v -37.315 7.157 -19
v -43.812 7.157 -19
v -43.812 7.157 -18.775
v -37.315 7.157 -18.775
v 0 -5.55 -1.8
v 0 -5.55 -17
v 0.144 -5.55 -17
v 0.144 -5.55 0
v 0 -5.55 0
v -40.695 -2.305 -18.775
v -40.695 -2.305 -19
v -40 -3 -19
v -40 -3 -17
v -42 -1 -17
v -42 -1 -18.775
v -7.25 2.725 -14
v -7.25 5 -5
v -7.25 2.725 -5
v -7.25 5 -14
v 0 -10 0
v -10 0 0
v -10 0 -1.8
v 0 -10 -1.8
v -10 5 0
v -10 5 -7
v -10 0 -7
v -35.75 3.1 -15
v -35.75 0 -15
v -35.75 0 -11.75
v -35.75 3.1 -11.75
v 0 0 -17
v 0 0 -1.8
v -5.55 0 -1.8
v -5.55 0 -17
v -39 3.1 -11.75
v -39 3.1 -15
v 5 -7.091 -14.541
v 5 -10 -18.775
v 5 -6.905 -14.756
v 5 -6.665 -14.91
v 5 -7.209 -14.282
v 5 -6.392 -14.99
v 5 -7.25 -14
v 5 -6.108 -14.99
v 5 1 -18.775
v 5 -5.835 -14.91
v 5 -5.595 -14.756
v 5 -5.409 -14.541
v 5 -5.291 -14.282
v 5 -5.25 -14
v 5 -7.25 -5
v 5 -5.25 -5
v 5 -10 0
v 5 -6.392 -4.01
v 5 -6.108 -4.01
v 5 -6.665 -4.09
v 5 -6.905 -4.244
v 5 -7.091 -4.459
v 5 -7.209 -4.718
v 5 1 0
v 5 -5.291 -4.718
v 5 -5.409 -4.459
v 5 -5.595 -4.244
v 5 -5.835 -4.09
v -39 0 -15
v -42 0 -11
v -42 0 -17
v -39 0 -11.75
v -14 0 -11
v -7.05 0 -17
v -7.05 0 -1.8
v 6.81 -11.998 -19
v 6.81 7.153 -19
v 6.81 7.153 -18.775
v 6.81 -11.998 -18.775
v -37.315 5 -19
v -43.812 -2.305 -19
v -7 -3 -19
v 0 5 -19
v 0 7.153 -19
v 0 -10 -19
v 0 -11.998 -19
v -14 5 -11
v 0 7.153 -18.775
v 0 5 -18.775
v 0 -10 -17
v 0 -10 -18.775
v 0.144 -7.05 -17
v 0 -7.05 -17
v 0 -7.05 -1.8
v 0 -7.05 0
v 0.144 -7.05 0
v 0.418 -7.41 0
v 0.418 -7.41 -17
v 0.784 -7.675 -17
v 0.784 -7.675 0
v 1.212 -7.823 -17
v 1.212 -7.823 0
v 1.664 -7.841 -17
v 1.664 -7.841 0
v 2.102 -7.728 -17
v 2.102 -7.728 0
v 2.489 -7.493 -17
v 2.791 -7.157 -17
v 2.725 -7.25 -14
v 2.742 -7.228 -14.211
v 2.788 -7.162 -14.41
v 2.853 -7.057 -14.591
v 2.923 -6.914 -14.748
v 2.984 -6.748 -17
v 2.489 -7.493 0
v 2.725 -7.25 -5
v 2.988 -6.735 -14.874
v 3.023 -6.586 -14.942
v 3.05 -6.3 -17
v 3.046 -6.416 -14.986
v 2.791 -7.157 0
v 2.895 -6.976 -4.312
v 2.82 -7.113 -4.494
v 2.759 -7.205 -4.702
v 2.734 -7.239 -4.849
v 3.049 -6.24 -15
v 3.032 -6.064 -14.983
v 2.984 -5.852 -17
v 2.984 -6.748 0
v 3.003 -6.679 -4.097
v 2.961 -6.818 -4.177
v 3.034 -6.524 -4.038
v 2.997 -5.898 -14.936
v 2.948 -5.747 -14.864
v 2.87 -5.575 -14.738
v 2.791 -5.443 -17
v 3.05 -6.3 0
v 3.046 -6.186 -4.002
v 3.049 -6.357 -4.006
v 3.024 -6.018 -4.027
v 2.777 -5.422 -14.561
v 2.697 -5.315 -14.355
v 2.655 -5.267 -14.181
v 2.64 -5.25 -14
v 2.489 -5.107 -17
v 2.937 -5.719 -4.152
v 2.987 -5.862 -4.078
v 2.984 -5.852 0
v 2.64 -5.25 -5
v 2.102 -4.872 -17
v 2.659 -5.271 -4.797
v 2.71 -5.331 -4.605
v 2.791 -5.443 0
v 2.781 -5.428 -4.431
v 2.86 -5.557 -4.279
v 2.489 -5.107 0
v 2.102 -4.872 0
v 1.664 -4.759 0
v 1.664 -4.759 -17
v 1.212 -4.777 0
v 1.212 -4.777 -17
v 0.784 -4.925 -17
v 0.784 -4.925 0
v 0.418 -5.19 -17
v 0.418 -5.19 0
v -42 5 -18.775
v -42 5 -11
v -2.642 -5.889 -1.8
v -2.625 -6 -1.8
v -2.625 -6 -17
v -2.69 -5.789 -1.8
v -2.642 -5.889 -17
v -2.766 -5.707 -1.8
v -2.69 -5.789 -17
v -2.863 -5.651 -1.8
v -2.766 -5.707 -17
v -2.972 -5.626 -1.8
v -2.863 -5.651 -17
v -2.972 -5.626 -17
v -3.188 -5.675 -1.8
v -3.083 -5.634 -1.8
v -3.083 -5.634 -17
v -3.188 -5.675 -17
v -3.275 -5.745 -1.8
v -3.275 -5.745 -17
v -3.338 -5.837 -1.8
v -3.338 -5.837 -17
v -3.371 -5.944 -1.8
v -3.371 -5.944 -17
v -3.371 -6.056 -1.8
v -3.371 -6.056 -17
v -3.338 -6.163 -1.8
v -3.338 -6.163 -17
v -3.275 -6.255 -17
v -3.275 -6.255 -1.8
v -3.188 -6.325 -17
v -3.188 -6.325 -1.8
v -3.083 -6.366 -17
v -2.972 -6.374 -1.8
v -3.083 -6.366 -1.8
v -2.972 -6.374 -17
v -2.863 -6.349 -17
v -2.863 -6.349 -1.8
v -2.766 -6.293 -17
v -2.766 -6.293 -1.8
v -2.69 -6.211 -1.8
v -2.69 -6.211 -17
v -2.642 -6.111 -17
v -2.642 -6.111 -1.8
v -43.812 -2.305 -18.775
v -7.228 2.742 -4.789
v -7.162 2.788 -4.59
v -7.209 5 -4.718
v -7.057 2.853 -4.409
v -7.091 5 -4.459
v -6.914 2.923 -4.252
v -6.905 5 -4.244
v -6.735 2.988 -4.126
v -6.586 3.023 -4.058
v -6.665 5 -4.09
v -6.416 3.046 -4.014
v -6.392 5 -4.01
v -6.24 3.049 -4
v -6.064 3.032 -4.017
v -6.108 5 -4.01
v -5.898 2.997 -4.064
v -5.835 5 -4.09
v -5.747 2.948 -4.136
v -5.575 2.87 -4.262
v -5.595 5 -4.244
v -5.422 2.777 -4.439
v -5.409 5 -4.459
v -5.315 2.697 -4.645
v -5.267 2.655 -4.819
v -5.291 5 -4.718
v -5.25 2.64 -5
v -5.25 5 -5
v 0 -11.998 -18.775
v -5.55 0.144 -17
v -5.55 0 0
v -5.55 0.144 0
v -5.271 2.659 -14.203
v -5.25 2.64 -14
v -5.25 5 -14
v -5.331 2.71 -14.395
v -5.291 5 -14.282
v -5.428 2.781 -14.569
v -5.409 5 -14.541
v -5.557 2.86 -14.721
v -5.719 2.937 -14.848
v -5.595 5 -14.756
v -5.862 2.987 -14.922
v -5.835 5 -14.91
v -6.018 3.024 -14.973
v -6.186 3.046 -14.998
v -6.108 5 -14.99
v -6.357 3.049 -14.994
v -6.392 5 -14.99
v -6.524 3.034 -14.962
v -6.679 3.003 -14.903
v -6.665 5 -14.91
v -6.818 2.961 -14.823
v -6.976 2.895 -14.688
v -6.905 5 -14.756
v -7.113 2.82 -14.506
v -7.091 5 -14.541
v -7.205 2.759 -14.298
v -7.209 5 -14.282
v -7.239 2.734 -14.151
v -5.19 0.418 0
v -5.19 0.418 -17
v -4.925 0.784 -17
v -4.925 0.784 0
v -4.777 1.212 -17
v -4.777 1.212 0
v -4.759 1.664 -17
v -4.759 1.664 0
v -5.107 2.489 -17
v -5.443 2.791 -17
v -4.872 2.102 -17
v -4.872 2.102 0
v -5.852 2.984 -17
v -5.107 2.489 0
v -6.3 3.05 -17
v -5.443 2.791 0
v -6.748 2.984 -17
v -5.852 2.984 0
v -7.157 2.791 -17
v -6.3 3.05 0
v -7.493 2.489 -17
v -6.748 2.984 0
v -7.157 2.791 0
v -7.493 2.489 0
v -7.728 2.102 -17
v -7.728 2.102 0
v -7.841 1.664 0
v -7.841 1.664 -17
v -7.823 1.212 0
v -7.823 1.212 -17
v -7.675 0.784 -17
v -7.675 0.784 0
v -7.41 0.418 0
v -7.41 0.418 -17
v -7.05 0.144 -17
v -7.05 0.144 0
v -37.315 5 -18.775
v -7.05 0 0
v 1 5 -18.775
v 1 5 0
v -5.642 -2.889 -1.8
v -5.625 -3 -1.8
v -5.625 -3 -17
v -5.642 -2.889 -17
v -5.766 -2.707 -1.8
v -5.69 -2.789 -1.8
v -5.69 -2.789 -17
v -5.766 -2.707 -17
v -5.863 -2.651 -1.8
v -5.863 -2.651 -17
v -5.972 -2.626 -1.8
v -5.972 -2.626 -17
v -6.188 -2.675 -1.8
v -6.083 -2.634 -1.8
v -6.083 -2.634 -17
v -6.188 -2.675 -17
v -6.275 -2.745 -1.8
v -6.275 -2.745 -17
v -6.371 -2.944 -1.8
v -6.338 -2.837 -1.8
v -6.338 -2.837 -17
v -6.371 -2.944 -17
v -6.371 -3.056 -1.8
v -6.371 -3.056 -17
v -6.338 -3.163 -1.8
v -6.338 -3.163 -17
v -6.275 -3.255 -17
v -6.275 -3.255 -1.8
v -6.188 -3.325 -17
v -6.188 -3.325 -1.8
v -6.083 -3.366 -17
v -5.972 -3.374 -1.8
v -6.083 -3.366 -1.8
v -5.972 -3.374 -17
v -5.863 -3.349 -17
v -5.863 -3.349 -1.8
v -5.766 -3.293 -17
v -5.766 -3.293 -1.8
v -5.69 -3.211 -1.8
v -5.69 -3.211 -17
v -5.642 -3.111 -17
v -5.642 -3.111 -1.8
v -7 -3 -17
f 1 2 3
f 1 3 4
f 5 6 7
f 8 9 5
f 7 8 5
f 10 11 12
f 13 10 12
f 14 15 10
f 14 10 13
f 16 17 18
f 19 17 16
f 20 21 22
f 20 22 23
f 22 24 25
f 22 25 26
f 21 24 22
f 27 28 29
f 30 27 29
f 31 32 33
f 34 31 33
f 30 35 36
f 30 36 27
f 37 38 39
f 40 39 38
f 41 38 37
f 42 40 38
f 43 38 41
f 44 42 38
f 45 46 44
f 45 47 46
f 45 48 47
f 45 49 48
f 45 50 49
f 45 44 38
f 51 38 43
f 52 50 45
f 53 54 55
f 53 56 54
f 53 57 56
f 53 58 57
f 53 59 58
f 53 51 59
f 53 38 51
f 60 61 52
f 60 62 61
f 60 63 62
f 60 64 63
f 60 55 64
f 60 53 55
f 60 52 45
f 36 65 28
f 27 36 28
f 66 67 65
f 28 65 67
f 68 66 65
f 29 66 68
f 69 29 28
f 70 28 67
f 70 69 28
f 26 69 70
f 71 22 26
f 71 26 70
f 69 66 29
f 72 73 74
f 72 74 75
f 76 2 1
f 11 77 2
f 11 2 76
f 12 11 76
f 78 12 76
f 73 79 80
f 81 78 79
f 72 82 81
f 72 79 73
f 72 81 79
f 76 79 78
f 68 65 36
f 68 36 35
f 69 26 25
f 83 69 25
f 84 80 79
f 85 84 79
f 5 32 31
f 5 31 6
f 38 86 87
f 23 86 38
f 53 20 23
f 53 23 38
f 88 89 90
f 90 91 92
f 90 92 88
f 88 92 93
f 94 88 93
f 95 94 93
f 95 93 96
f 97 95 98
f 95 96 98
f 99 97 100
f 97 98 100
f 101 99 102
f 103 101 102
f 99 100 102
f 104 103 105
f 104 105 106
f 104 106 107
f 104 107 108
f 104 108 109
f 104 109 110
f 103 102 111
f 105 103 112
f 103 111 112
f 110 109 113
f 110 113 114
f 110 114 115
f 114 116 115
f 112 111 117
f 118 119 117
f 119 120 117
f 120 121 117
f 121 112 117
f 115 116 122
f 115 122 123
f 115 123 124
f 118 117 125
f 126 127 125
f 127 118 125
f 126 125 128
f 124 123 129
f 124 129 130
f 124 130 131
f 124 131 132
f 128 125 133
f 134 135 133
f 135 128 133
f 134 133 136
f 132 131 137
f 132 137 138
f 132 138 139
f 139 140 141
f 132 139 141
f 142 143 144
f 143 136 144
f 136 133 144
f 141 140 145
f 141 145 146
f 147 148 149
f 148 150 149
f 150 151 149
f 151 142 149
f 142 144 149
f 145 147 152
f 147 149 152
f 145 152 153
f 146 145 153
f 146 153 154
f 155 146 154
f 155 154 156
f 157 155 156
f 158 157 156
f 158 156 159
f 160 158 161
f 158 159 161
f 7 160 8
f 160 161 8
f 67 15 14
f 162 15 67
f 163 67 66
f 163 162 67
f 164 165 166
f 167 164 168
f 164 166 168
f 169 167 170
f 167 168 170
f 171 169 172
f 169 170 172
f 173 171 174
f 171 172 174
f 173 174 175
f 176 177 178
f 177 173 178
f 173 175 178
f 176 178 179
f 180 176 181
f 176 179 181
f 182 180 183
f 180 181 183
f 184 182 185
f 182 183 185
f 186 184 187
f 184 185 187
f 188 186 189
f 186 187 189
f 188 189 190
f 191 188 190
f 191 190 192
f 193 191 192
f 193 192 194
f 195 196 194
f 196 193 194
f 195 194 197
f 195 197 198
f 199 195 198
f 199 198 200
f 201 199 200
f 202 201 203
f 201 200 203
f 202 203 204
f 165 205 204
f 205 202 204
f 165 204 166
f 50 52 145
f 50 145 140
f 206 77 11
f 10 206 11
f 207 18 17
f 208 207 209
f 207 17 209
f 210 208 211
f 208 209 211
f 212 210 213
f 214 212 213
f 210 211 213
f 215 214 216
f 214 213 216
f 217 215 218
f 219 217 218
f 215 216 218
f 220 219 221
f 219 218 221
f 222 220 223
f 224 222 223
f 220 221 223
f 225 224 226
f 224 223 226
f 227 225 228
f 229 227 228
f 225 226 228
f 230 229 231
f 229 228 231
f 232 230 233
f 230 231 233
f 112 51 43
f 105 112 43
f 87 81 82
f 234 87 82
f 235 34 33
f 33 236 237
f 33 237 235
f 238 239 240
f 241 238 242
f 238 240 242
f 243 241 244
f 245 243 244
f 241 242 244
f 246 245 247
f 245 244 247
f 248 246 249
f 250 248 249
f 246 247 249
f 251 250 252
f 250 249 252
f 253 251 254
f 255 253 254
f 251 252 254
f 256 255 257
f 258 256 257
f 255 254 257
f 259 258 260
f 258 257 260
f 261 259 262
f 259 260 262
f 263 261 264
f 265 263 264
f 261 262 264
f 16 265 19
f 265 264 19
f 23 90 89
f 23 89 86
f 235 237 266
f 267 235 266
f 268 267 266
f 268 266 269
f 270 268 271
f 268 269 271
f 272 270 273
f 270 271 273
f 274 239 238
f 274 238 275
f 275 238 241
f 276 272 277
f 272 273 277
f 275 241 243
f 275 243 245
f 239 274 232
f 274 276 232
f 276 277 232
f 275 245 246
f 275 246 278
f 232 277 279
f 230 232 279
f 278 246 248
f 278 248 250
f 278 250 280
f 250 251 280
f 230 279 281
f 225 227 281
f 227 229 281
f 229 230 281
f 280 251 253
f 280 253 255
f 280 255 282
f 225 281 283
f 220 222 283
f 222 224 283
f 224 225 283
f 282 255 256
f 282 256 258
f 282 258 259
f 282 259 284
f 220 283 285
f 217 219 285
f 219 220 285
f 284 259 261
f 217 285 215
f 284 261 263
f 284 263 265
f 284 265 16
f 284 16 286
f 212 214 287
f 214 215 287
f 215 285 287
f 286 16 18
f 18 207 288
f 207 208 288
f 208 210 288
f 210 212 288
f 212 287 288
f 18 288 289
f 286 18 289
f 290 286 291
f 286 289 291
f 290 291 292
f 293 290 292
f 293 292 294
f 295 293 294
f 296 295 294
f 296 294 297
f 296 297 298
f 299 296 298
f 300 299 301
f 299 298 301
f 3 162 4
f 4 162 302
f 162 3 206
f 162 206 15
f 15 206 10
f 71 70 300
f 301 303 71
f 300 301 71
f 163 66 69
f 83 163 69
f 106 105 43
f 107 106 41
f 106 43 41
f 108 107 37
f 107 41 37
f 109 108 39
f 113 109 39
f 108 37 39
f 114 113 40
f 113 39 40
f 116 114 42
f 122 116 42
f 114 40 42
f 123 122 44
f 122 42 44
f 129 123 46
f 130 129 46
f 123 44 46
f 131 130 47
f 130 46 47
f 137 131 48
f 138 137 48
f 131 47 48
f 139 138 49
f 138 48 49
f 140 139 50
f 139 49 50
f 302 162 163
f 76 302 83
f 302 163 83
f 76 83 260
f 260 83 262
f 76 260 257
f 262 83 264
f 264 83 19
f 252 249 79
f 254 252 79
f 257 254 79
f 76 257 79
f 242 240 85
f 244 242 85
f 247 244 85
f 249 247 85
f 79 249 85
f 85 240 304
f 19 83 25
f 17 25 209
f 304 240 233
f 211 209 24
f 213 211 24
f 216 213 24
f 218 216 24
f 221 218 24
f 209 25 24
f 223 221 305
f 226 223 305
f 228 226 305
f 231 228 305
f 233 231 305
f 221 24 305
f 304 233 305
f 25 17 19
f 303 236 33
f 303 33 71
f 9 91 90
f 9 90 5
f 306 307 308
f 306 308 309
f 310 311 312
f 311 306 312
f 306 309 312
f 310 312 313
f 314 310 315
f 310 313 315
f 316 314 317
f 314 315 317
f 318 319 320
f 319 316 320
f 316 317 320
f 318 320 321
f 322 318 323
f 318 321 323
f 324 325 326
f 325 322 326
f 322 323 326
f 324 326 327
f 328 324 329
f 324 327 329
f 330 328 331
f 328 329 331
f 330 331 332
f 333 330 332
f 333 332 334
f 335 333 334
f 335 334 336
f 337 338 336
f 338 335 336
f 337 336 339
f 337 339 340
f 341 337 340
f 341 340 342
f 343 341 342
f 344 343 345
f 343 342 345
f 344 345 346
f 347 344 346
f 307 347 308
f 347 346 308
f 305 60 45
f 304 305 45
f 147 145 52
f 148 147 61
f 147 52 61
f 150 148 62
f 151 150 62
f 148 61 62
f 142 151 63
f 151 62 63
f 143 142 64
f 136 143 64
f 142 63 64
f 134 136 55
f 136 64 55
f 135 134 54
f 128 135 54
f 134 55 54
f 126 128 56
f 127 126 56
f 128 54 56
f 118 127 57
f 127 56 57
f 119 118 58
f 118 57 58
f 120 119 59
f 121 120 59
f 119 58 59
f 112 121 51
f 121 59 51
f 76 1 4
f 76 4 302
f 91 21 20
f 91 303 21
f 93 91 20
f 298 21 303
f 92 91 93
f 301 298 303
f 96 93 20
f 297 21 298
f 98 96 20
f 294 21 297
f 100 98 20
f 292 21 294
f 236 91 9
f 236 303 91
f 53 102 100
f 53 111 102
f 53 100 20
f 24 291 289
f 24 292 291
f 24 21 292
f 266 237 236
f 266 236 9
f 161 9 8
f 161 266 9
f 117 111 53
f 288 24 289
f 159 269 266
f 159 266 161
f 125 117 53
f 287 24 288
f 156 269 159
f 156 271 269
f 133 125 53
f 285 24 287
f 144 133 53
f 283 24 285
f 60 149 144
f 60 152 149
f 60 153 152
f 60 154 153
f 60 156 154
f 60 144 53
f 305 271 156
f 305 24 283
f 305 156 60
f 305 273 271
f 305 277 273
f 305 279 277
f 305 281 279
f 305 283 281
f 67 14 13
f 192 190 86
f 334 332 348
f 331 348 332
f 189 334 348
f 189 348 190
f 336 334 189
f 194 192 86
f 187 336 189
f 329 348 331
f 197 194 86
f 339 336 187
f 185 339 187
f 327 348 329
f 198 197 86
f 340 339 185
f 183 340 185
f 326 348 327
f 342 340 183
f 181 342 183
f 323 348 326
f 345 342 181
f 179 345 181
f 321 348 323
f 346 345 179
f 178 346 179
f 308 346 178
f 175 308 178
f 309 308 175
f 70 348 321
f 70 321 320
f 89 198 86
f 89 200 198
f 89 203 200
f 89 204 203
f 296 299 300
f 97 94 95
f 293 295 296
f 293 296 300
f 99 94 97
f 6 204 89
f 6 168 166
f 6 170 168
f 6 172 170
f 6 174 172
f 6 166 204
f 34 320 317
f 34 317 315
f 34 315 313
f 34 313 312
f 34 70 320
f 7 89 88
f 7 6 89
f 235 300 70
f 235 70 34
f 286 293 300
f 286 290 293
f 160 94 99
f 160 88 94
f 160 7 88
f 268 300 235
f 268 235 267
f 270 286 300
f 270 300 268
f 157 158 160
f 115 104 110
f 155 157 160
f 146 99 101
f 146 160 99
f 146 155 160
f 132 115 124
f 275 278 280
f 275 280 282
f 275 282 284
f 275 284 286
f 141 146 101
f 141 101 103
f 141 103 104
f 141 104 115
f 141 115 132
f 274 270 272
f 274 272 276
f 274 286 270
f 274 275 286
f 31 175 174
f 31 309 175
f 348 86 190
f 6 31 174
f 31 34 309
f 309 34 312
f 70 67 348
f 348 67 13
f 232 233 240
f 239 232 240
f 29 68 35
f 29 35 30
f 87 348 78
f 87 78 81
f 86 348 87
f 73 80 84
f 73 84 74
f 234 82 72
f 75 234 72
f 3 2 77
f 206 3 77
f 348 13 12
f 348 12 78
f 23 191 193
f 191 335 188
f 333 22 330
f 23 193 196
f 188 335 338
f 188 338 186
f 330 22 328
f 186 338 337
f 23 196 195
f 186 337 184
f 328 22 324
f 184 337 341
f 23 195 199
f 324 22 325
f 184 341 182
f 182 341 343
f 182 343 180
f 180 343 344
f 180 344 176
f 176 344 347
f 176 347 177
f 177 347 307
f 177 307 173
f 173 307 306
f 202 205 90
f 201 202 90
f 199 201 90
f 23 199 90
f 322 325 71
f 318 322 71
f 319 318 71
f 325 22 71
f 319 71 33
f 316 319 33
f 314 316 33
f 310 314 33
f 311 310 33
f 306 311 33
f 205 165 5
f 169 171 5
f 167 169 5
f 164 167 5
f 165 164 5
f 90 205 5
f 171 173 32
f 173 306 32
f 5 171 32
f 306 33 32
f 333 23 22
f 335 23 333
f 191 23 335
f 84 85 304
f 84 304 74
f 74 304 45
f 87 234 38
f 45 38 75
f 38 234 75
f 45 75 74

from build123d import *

# Parameters (mm, degrees)
PAD_DEPTH       = 17
PAD001_DEPTH    = 2
PAD002_DEPTH    = 1.8
SKETCH003_W     = 32
SKETCH003_H     = 8
PAD003_DEPTH    = 5
SKETCH004_W     = 3.25
SKETCH004_H     = 3.25
POCKET_DEPTH    = 3.1
SKETCH005_W     = 6.497684
SKETCH005_H     = 9.461539
SKETCH005_W_2   = 6.809606
SKETCH005_H_2   = 19.151065
PAD004_DEPTH    = 0.225
CHAMFER_SIZE    = 4
SKETCH006_R     = 0.375
PAD005_DEPTH    = 16
POCKET001_DEPTH = 3
POCKET002_DEPTH = 3
SKETCH009_W     = 42
SKETCH009_H     = 2
PAD006_DEPTH    = 3
CHAMFER001_SIZE = 2


with BuildPart() as part:
    # Sketch → Pad (new body)
    with BuildSketch(Plane.XY):
        with BuildLine():
            Line((-10, 0), (-10, 5))
            Line((-10, 5), (5, 5))
            Line((5, 5), (5, -10))
            Line((5, -10), (0, -10))
            Line((0, -7.05), (0, -10))
            Line((0, -7.05), (0.143534, -7.05))
            ThreePointArc((0.143534, -7.05), (3.05, -6.3), (0.143534, -5.55))
            Line((0, -5.55), (0.143534, -5.55))
            Line((0, 0), (0, -5.55))
            Line((0, 0), (-5.55, 0))
            Line((-5.55, 0), (-5.55, 0.143534))
            ThreePointArc((-5.55, 0.143534), (-6.3, 3.05), (-7.05, 0.143534))
            Line((-7.05, 0), (-7.05, 0.143534))
            Line((-10, 0), (-7.05, 0))
        make_face()
    extrude(amount=-PAD_DEPTH)

    # Sketch001 (on Face16 of Pad) → Pad001 (join)
    with BuildSketch(Plane(origin=(0, 0, -17), x_dir=(1, 0, 0), z_dir=(0, 0, -1))):
        Polygon((5, -5), (-10, -5), (-10, 0), (0, 10), (5, 10), align=None)
    extrude(amount=PAD001_DEPTH)

    # Sketch002 (on Face1 of Pad001) → Pad002 (join)
    with BuildSketch(Plane.XY):
        Polygon((0, -10), (0, 0), (-10, 0), align=None)
    extrude(amount=-PAD002_DEPTH)

    # Sketch003 (on Face10 of Pad002) → Pad003 (join)
    with BuildSketch(Plane.XZ):
        with Locations((-26, -15)):
            Rectangle(SKETCH003_W, SKETCH003_H)
    extrude(amount=-PAD003_DEPTH)

    # Sketch004 (on Face22 of Pad003) → Pocket (cut)
    with BuildSketch(Plane.XZ):
        with Locations((-37.375, -13.375)):
            Rectangle(SKETCH004_W, SKETCH004_H)
    extrude(amount=-POCKET_DEPTH, mode=Mode.SUBTRACT)

    # Sketch005 → Pad004 (join)
    with BuildSketch(Plane(origin=(0, 0, -19), x_dir=(1, 0, 0), z_dir=(0, 0, -1))):
        with Locations((-40.563391, -2.425933)):
            Rectangle(SKETCH005_W, SKETCH005_H)
        with Locations((3.404803, 2.422745)):
            Rectangle(SKETCH005_W_2, SKETCH005_H_2)
    extrude(amount=-PAD004_DEPTH)

    # Chamfer
    chamfer_edges = [part.edges().sort_by_distance(p)[0] for p in [
        (-10, 2.5, -11),
        (5, 5, -9.3875),
    ]]
    chamfer(chamfer_edges, length=CHAMFER_SIZE)

    # Sketch006 (on Face29 of Chamfer) → Pad005 (join)
    with BuildSketch(Plane.XY.offset(-17)):
        with Locations((-6, -3)):
            Circle(SKETCH006_R)
        with Locations((-3, -6)):
            Circle(SKETCH006_R)
    extrude(amount=PAD005_DEPTH)

    # Sketch007 (on Face2 of Pad005) → Pocket001 (cut, symmetric)
    with BuildSketch(Plane.YZ.offset(5)):
        with BuildLine():
            ThreePointArc((-5.25, -5), (-6.25, -4), (-7.25, -5))
            Line((-7.25, -5), (-7.25, -14))
            ThreePointArc((-7.25, -14), (-6.25, -15), (-5.25, -14))
            Line((-5.25, -5), (-5.25, -14))
        make_face()
    extrude(amount=POCKET001_DEPTH, both=True, mode=Mode.SUBTRACT)

    # Sketch008 (on Face5 of Pocket001) → Pocket002 (cut)
    with BuildSketch(Plane(origin=(0, 5, 0), x_dir=(-1, 0, 0), z_dir=(0, 1, 0))):
        with BuildLine():
            ThreePointArc((7.25, -5), (6.25, -4), (5.25, -5))
            Line((5.25, -5), (5.25, -14))
            ThreePointArc((5.25, -14), (6.25, -15), (7.25, -14))
            Line((7.25, -5), (7.25, -14))
        make_face()
    extrude(amount=-POCKET002_DEPTH, mode=Mode.SUBTRACT)

    # Sketch009 (on Face35 of Pocket002) → Pad006 (join)
    with BuildSketch(Plane.XZ):
        with Locations((-21, -18)):
            Rectangle(SKETCH009_W, SKETCH009_H)
    extrude(amount=PAD006_DEPTH)

    # Chamfer001
    chamfer001_edges = [part.edges().sort_by_distance(p)[0] for p in [
        (-42, -3, -18),
    ]]
    chamfer(chamfer001_edges, length=CHAMFER001_SIZE)


solid = part.part
